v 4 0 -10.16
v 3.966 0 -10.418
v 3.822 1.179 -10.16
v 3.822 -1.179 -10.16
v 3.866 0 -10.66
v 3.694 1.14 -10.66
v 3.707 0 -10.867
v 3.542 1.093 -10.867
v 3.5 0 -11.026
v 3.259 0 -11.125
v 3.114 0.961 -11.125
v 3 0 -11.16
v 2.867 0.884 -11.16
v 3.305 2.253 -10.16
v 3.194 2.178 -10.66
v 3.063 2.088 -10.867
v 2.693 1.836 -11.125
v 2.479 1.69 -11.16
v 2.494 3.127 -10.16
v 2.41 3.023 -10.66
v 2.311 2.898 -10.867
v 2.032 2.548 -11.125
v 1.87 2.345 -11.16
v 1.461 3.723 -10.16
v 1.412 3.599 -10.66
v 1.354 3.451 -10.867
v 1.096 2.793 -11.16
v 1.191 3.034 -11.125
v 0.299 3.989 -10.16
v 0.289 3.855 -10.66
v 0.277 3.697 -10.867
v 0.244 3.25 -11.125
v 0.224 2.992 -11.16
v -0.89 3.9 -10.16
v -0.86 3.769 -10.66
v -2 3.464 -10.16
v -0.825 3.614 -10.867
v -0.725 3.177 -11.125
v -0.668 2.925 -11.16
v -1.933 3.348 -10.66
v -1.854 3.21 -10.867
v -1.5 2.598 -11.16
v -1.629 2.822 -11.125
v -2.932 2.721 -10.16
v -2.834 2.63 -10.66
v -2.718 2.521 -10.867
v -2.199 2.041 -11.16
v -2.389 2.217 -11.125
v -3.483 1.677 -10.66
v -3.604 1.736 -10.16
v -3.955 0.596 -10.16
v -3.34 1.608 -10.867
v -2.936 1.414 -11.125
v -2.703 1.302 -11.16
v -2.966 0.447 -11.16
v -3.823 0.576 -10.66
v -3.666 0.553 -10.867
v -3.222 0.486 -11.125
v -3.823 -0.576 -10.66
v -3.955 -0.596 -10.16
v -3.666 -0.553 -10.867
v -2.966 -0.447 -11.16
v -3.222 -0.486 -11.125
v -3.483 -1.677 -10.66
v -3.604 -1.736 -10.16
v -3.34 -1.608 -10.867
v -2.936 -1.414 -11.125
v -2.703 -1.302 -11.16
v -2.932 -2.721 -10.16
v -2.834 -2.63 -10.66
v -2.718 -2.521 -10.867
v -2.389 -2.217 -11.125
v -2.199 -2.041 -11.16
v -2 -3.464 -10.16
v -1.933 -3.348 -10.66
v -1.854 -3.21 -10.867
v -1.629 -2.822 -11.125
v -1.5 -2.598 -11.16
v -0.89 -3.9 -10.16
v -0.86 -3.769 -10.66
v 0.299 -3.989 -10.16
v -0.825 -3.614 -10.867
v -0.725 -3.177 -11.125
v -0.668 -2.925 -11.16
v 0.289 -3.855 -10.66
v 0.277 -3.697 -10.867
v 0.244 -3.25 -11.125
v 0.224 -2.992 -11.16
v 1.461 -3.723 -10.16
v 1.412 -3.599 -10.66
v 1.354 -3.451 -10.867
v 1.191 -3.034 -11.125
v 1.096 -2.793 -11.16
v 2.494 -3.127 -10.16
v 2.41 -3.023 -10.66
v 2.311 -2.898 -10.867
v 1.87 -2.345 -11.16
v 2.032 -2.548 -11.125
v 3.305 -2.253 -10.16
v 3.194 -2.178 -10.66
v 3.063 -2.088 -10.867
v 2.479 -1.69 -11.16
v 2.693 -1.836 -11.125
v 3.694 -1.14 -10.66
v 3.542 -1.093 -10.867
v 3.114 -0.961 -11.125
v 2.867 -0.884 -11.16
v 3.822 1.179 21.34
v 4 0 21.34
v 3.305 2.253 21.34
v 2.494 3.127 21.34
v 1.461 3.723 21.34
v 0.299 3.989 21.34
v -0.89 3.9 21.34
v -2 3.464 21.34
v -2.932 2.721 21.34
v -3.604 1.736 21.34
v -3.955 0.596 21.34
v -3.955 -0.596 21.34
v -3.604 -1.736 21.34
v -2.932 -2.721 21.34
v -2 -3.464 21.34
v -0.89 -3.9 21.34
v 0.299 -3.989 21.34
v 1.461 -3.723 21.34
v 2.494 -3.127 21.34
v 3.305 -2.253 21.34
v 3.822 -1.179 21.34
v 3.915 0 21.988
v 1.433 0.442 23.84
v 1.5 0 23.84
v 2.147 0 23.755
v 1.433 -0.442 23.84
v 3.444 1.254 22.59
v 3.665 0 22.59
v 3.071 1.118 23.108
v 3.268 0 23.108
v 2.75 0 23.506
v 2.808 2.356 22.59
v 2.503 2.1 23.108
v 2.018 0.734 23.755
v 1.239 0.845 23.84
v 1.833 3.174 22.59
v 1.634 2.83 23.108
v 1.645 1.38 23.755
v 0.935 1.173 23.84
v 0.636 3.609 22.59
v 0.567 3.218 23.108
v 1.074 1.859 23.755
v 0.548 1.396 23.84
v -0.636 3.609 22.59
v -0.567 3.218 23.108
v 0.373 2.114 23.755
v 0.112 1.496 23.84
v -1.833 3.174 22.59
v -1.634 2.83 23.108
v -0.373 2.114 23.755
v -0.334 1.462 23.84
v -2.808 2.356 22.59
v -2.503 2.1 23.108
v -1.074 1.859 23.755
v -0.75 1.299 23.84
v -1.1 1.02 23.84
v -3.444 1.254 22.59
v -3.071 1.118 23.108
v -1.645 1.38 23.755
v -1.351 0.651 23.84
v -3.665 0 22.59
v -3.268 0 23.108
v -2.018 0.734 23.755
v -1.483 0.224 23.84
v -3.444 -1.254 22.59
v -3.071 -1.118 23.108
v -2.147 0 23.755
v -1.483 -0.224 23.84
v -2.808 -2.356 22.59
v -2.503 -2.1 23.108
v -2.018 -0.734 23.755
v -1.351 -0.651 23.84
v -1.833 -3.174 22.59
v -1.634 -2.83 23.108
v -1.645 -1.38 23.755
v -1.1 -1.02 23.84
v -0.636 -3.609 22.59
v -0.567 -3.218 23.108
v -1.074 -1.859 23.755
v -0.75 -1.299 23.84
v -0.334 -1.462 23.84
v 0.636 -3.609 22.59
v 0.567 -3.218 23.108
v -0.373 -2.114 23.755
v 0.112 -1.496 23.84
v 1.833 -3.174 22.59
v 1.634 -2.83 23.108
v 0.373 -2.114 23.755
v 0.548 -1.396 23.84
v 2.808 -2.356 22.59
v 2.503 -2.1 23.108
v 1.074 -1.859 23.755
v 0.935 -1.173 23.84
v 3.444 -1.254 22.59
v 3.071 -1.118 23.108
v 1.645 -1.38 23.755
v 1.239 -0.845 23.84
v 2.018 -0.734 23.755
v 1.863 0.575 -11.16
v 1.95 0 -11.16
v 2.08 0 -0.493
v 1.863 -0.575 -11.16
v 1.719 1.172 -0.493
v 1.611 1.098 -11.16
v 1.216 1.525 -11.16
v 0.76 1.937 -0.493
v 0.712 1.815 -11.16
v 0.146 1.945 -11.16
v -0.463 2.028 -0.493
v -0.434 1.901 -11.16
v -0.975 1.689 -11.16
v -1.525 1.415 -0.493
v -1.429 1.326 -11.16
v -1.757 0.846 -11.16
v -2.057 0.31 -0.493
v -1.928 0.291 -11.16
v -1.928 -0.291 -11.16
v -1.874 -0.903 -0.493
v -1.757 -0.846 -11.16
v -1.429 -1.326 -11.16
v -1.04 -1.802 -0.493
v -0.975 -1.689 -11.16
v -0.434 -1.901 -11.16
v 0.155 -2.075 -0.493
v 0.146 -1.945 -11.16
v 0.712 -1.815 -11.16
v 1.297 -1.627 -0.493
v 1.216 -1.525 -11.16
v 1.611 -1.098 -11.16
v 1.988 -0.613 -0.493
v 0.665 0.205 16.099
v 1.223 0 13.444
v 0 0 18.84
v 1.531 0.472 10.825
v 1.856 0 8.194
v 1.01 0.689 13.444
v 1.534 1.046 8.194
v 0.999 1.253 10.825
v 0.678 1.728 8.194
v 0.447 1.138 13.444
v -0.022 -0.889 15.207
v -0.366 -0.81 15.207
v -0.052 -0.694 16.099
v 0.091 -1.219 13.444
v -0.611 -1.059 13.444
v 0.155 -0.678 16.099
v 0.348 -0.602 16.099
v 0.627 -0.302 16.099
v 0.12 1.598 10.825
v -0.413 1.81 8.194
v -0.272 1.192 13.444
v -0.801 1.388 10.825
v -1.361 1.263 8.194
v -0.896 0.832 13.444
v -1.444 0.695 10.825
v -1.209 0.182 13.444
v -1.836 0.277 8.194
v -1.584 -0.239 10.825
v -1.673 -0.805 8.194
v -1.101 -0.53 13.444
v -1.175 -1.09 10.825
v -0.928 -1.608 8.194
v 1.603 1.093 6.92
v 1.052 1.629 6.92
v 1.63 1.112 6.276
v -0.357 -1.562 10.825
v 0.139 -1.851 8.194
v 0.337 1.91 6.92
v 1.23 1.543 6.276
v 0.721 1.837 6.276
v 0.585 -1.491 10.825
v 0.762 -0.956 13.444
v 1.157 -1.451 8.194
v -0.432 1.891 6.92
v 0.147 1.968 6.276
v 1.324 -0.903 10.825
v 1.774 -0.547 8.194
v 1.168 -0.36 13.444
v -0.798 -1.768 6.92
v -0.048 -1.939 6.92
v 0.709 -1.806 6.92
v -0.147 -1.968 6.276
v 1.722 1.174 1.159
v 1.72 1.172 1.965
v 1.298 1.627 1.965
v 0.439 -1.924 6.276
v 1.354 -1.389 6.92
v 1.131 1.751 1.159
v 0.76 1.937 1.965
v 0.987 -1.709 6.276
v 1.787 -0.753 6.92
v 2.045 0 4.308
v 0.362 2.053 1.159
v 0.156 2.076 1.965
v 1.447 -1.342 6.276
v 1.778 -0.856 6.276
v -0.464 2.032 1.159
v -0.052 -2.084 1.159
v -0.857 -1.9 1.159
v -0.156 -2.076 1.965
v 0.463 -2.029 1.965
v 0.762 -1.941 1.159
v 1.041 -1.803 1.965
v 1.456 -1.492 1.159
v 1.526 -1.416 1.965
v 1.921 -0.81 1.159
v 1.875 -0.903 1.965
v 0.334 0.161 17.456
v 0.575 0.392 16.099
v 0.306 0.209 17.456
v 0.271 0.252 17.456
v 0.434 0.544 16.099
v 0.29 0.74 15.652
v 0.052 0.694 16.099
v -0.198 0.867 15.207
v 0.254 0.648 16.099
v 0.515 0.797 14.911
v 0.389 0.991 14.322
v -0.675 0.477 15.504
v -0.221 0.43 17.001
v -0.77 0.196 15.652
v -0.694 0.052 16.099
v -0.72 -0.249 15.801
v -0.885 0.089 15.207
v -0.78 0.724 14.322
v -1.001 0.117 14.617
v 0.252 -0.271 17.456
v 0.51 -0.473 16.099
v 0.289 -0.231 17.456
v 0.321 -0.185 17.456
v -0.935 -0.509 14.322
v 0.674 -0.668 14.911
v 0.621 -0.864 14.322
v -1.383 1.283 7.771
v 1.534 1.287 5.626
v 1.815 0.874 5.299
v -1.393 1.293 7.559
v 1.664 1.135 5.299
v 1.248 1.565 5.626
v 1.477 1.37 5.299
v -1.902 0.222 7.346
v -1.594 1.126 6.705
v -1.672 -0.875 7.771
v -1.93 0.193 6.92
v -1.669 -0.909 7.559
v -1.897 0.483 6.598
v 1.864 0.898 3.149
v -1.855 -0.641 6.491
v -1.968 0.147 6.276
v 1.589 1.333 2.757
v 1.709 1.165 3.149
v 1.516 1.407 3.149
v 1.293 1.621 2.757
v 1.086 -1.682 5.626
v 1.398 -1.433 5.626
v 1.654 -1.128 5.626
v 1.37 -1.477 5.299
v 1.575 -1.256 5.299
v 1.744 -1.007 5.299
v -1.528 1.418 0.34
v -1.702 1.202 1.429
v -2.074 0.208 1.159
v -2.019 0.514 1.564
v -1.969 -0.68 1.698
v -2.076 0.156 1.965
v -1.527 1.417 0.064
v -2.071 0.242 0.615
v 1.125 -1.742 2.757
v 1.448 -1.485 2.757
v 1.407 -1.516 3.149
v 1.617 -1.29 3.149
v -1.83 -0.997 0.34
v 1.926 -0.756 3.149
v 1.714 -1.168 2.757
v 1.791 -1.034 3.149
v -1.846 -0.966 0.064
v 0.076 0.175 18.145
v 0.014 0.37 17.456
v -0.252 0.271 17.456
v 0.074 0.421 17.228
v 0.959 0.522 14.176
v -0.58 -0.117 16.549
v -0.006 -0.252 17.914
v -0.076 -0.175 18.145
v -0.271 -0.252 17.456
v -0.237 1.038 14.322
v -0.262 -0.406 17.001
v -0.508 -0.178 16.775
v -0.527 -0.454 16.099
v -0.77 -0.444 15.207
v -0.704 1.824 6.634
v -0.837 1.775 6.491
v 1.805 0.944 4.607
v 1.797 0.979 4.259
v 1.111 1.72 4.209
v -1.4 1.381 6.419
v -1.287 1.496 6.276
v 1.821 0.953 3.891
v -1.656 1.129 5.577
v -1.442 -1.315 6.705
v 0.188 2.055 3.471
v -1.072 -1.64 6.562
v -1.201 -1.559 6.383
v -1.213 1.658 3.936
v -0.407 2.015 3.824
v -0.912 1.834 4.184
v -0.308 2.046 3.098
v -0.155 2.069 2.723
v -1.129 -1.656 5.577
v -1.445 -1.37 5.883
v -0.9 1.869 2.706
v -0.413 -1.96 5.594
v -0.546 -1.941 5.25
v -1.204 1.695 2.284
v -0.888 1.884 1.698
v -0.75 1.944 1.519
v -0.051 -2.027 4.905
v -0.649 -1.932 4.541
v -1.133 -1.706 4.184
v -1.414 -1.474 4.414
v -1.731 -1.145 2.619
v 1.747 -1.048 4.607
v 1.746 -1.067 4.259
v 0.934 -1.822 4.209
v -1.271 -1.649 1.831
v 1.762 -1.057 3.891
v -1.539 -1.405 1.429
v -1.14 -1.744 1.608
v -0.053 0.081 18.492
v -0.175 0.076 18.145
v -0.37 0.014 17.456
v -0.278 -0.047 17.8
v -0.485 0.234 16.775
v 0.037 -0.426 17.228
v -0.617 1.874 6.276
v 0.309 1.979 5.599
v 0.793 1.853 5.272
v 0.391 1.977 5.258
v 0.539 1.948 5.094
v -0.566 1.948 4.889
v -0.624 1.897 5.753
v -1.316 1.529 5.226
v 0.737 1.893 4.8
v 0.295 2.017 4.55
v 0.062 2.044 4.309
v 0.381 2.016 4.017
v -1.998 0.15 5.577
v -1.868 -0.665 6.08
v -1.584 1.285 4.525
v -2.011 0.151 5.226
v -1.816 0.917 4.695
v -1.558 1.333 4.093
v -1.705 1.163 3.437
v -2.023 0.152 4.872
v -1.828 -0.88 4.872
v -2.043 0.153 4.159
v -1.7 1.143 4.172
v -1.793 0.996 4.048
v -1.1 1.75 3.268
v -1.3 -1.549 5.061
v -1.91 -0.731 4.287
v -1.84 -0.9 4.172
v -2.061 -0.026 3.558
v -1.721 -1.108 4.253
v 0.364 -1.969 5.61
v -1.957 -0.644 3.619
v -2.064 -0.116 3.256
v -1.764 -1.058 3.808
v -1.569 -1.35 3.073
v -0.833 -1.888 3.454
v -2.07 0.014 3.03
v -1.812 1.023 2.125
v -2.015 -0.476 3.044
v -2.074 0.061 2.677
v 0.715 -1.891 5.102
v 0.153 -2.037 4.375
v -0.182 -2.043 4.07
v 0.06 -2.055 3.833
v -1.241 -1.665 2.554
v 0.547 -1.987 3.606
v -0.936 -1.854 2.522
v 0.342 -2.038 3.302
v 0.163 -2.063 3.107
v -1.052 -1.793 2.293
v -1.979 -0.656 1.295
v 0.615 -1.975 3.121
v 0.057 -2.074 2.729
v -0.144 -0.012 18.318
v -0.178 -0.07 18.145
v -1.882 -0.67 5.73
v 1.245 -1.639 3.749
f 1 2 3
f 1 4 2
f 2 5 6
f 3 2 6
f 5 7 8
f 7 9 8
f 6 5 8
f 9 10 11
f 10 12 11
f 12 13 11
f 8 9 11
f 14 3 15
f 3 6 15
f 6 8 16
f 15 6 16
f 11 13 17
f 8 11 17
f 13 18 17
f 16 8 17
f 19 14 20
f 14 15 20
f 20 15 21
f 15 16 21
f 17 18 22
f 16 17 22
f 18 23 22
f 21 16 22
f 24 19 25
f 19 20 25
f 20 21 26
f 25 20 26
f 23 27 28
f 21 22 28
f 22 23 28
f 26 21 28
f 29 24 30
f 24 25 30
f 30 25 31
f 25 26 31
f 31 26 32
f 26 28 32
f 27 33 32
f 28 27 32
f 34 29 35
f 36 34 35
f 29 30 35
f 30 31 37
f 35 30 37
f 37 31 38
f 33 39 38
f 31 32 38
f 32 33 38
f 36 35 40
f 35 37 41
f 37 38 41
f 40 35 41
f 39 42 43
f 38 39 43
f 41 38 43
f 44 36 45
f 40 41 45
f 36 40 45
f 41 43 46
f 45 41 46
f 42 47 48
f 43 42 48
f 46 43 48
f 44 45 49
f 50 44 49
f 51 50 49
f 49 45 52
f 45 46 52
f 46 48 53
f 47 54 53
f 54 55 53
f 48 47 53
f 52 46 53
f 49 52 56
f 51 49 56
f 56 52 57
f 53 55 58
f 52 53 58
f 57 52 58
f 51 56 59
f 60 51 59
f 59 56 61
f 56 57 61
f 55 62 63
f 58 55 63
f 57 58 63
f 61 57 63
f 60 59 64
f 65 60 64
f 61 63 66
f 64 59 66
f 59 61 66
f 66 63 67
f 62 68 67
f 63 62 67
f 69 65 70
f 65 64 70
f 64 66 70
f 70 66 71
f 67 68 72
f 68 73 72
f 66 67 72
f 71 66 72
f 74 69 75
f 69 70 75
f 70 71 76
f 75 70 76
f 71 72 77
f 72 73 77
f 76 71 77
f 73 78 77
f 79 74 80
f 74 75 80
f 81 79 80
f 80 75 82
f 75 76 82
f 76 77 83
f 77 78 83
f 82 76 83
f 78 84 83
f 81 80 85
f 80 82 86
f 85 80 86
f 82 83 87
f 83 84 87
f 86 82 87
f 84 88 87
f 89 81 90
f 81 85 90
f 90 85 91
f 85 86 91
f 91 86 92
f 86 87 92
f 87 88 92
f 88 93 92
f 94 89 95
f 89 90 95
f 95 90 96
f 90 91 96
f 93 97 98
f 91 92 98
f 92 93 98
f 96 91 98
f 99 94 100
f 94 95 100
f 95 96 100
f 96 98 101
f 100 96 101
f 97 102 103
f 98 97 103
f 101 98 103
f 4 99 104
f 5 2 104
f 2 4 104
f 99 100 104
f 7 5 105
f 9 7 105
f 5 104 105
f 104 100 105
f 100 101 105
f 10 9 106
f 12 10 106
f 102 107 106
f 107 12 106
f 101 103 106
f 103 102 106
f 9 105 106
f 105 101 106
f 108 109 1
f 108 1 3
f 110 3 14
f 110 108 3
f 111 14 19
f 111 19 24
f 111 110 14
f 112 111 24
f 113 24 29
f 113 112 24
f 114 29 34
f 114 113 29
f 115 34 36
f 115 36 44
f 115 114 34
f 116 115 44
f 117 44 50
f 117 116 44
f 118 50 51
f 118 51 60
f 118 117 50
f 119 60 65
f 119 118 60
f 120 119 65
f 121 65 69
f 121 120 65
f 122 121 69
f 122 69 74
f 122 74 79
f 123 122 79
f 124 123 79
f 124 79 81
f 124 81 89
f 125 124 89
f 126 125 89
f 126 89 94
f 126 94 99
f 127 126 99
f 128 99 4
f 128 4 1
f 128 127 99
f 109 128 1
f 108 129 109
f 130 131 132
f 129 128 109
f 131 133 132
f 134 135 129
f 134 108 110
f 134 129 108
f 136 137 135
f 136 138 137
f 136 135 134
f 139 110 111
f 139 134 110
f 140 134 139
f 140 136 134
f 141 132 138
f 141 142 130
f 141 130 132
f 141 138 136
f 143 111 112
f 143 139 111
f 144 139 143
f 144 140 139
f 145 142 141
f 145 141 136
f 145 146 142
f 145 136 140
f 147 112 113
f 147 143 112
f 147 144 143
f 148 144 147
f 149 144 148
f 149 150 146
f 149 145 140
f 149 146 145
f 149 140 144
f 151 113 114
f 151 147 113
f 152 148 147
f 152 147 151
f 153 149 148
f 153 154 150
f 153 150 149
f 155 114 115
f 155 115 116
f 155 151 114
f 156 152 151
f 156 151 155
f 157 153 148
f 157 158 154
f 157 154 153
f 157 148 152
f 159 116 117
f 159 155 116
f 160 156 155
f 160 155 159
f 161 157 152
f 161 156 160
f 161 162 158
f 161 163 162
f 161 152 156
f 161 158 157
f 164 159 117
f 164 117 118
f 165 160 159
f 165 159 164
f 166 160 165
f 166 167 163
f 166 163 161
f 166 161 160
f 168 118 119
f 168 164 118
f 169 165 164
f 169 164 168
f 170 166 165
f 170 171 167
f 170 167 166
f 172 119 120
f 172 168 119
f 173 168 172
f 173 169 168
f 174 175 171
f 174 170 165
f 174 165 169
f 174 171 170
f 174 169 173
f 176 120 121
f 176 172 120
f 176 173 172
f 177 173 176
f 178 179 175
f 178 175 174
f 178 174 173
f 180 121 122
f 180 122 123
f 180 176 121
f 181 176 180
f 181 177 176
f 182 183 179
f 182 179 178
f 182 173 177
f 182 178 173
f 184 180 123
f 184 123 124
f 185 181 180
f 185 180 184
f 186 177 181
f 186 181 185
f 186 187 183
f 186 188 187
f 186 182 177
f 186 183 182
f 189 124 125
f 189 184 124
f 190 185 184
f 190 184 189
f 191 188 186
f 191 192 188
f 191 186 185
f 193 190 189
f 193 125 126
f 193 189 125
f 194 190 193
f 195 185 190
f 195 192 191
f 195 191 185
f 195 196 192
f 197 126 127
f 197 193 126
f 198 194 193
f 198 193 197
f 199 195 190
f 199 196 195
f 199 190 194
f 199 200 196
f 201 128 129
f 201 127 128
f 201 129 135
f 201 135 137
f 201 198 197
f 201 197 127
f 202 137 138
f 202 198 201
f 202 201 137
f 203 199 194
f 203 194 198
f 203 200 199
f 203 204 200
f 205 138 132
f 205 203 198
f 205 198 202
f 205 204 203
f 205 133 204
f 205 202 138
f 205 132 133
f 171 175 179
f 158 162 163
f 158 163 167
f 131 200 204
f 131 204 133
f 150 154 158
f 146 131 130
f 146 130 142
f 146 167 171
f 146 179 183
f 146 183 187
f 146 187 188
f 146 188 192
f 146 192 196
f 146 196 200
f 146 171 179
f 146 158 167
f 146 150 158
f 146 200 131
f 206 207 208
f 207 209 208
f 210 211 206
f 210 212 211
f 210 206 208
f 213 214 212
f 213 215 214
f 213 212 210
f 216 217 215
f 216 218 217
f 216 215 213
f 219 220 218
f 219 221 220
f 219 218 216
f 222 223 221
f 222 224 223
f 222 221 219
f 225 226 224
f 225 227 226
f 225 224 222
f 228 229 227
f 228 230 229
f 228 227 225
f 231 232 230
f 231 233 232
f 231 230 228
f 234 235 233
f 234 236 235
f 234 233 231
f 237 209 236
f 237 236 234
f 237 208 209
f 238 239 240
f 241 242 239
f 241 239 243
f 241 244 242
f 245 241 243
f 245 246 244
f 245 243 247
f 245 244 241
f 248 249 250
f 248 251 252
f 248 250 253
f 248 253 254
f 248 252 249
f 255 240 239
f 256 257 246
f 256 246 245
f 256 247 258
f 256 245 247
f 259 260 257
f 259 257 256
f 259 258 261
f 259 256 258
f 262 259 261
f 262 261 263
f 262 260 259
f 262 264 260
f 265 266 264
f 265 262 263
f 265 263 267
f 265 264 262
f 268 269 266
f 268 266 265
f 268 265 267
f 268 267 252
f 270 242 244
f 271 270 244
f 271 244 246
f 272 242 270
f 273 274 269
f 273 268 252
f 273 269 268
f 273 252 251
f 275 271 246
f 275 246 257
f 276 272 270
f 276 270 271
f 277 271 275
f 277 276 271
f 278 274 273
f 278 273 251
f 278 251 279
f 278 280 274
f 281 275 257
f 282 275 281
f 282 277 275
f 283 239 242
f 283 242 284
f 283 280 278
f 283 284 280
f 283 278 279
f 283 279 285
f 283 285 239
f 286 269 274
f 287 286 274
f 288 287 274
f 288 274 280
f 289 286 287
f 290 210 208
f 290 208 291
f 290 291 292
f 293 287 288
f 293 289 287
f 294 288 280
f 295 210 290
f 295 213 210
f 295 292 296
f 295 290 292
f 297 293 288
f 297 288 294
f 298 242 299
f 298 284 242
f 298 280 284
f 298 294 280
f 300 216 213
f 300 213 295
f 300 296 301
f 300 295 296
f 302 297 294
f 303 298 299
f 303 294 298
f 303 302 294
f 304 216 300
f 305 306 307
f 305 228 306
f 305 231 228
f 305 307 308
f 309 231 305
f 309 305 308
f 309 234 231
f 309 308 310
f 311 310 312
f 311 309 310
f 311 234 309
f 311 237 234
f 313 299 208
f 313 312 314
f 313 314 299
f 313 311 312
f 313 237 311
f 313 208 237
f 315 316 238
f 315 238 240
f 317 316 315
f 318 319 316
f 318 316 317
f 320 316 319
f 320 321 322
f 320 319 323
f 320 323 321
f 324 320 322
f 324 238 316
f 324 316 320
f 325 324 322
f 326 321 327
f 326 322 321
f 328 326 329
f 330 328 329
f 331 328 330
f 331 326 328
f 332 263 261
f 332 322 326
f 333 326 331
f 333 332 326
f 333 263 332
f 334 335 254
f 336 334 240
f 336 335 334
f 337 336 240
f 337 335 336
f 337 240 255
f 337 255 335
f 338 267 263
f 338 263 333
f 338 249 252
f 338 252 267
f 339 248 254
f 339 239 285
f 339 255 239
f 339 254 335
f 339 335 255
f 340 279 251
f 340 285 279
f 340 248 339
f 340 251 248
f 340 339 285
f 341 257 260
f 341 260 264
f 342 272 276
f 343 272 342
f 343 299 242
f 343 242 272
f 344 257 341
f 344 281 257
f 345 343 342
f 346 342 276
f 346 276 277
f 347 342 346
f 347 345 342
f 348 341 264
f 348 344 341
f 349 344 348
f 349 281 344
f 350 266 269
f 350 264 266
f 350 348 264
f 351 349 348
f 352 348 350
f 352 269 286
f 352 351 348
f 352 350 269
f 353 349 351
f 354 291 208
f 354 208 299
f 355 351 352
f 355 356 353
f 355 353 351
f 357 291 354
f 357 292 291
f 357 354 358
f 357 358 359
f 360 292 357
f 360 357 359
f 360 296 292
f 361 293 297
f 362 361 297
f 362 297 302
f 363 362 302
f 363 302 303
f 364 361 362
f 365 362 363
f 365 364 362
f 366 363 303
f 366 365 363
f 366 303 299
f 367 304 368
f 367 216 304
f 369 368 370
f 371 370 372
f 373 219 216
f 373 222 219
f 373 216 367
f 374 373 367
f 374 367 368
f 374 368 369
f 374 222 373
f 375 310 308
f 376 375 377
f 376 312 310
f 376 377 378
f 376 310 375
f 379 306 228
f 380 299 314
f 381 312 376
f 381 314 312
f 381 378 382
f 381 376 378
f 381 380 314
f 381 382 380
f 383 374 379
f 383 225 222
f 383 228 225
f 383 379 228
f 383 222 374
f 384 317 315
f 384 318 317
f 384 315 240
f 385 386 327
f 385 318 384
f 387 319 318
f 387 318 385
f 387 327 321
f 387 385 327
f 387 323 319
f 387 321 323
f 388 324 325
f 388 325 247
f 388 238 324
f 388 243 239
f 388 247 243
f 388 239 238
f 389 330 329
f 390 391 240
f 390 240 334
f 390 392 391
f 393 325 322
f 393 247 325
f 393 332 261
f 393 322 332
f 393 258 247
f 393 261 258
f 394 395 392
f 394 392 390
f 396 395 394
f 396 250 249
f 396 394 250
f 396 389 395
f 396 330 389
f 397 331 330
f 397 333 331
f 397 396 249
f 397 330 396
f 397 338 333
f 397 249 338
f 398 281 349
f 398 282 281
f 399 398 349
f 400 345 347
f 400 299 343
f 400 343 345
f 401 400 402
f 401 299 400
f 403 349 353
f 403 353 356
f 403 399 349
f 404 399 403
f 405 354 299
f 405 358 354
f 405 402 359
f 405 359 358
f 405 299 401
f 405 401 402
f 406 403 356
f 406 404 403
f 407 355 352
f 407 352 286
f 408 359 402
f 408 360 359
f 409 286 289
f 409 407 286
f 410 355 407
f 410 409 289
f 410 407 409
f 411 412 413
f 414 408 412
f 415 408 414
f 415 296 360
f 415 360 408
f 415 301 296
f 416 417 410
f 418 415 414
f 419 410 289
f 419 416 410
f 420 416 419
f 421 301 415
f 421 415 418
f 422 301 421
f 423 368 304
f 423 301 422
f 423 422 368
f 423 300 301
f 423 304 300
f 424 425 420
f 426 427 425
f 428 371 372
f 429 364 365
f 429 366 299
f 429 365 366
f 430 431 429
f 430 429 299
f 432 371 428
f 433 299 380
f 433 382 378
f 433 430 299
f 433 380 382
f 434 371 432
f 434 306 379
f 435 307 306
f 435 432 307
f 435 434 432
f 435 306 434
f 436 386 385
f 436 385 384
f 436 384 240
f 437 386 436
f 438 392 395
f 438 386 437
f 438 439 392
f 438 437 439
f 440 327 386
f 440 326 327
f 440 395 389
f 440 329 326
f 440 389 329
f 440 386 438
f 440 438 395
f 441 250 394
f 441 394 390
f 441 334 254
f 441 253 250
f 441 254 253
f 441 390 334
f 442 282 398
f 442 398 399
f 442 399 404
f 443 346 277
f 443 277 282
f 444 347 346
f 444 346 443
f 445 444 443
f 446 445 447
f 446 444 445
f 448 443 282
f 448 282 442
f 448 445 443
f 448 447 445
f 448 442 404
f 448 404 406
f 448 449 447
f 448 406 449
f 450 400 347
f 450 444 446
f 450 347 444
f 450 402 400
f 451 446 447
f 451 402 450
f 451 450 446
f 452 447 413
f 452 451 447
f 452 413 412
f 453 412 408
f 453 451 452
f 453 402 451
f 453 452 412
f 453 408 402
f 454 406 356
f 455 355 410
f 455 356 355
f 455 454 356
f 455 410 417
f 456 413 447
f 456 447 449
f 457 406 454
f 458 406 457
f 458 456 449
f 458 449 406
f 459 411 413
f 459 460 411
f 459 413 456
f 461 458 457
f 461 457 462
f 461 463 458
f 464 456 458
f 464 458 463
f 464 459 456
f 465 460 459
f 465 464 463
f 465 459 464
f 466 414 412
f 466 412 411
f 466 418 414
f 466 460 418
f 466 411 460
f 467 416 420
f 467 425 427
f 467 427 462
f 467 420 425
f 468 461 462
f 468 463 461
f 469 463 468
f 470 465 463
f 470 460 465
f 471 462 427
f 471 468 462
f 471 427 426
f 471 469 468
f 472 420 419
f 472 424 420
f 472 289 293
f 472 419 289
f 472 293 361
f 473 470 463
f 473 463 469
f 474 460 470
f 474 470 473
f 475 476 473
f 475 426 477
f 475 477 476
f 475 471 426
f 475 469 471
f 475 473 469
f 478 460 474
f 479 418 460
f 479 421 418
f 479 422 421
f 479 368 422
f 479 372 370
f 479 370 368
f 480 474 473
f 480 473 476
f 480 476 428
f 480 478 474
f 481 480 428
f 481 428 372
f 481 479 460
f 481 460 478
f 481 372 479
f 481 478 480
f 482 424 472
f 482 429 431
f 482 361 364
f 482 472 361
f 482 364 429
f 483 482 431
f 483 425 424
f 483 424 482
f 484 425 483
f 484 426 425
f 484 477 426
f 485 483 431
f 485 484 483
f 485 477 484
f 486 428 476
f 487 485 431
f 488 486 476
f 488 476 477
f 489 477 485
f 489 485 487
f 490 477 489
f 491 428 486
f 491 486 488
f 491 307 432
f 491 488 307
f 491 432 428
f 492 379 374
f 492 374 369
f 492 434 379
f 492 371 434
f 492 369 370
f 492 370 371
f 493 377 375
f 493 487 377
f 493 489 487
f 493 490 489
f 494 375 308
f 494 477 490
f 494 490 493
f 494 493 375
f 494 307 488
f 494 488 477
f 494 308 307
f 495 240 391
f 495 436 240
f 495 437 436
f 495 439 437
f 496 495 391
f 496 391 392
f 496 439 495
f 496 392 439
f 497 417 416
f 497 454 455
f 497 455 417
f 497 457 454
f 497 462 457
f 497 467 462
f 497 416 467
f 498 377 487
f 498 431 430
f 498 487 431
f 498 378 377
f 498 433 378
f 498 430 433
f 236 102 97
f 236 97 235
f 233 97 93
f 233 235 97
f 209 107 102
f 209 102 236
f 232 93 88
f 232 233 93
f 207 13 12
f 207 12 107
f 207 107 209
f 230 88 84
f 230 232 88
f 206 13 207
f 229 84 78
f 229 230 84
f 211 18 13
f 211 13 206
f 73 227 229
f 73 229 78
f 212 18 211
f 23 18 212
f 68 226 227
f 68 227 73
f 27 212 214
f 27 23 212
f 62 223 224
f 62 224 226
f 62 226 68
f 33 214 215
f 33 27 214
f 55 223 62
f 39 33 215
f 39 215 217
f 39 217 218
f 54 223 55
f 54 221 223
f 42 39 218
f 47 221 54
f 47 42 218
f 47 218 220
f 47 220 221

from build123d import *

# Parameters (mm, degrees)
F2_R = 2.5
F3_R = 1


with BuildPart() as f1:
    # F0 (on Front) → F1 (revolve)
    with BuildSketch(Plane.XZ):
        with BuildLine():
            add(Edge.make_bspline(
                [(0, 18.840477), (2.666021, 9.358742), (2.056838, 2.173811), (1.95, -11.159523)],
                knots=[0, 0, 0, 0, 30.063308, 30.063308, 30.063308, 30.063308], degree=3))
            Line((1.95, -11.159523), (4, -11.159523))
            Line((4, -11.159523), (4, 23.840477))
            Line((4, 23.840477), (0, 23.840477))
            Line((0, 23.840477), (0, 18.840477))
        make_face()
    revolve(axis=Axis((0, 0, 3.840477), (0, 0, 1)))

    # F2
    f2_edges = [f1.edges().sort_by_distance(p)[0] for p in [
        (-4, 0, 23.840477),
    ]]
    fillet(f2_edges, radius=F2_R)

    # F3
    f3_edges = [f1.edges().sort_by_distance(p)[0] for p in [
        (-4, 0, -11.159523),
    ]]
    fillet(f3_edges, radius=F3_R)


solid = f1.part
